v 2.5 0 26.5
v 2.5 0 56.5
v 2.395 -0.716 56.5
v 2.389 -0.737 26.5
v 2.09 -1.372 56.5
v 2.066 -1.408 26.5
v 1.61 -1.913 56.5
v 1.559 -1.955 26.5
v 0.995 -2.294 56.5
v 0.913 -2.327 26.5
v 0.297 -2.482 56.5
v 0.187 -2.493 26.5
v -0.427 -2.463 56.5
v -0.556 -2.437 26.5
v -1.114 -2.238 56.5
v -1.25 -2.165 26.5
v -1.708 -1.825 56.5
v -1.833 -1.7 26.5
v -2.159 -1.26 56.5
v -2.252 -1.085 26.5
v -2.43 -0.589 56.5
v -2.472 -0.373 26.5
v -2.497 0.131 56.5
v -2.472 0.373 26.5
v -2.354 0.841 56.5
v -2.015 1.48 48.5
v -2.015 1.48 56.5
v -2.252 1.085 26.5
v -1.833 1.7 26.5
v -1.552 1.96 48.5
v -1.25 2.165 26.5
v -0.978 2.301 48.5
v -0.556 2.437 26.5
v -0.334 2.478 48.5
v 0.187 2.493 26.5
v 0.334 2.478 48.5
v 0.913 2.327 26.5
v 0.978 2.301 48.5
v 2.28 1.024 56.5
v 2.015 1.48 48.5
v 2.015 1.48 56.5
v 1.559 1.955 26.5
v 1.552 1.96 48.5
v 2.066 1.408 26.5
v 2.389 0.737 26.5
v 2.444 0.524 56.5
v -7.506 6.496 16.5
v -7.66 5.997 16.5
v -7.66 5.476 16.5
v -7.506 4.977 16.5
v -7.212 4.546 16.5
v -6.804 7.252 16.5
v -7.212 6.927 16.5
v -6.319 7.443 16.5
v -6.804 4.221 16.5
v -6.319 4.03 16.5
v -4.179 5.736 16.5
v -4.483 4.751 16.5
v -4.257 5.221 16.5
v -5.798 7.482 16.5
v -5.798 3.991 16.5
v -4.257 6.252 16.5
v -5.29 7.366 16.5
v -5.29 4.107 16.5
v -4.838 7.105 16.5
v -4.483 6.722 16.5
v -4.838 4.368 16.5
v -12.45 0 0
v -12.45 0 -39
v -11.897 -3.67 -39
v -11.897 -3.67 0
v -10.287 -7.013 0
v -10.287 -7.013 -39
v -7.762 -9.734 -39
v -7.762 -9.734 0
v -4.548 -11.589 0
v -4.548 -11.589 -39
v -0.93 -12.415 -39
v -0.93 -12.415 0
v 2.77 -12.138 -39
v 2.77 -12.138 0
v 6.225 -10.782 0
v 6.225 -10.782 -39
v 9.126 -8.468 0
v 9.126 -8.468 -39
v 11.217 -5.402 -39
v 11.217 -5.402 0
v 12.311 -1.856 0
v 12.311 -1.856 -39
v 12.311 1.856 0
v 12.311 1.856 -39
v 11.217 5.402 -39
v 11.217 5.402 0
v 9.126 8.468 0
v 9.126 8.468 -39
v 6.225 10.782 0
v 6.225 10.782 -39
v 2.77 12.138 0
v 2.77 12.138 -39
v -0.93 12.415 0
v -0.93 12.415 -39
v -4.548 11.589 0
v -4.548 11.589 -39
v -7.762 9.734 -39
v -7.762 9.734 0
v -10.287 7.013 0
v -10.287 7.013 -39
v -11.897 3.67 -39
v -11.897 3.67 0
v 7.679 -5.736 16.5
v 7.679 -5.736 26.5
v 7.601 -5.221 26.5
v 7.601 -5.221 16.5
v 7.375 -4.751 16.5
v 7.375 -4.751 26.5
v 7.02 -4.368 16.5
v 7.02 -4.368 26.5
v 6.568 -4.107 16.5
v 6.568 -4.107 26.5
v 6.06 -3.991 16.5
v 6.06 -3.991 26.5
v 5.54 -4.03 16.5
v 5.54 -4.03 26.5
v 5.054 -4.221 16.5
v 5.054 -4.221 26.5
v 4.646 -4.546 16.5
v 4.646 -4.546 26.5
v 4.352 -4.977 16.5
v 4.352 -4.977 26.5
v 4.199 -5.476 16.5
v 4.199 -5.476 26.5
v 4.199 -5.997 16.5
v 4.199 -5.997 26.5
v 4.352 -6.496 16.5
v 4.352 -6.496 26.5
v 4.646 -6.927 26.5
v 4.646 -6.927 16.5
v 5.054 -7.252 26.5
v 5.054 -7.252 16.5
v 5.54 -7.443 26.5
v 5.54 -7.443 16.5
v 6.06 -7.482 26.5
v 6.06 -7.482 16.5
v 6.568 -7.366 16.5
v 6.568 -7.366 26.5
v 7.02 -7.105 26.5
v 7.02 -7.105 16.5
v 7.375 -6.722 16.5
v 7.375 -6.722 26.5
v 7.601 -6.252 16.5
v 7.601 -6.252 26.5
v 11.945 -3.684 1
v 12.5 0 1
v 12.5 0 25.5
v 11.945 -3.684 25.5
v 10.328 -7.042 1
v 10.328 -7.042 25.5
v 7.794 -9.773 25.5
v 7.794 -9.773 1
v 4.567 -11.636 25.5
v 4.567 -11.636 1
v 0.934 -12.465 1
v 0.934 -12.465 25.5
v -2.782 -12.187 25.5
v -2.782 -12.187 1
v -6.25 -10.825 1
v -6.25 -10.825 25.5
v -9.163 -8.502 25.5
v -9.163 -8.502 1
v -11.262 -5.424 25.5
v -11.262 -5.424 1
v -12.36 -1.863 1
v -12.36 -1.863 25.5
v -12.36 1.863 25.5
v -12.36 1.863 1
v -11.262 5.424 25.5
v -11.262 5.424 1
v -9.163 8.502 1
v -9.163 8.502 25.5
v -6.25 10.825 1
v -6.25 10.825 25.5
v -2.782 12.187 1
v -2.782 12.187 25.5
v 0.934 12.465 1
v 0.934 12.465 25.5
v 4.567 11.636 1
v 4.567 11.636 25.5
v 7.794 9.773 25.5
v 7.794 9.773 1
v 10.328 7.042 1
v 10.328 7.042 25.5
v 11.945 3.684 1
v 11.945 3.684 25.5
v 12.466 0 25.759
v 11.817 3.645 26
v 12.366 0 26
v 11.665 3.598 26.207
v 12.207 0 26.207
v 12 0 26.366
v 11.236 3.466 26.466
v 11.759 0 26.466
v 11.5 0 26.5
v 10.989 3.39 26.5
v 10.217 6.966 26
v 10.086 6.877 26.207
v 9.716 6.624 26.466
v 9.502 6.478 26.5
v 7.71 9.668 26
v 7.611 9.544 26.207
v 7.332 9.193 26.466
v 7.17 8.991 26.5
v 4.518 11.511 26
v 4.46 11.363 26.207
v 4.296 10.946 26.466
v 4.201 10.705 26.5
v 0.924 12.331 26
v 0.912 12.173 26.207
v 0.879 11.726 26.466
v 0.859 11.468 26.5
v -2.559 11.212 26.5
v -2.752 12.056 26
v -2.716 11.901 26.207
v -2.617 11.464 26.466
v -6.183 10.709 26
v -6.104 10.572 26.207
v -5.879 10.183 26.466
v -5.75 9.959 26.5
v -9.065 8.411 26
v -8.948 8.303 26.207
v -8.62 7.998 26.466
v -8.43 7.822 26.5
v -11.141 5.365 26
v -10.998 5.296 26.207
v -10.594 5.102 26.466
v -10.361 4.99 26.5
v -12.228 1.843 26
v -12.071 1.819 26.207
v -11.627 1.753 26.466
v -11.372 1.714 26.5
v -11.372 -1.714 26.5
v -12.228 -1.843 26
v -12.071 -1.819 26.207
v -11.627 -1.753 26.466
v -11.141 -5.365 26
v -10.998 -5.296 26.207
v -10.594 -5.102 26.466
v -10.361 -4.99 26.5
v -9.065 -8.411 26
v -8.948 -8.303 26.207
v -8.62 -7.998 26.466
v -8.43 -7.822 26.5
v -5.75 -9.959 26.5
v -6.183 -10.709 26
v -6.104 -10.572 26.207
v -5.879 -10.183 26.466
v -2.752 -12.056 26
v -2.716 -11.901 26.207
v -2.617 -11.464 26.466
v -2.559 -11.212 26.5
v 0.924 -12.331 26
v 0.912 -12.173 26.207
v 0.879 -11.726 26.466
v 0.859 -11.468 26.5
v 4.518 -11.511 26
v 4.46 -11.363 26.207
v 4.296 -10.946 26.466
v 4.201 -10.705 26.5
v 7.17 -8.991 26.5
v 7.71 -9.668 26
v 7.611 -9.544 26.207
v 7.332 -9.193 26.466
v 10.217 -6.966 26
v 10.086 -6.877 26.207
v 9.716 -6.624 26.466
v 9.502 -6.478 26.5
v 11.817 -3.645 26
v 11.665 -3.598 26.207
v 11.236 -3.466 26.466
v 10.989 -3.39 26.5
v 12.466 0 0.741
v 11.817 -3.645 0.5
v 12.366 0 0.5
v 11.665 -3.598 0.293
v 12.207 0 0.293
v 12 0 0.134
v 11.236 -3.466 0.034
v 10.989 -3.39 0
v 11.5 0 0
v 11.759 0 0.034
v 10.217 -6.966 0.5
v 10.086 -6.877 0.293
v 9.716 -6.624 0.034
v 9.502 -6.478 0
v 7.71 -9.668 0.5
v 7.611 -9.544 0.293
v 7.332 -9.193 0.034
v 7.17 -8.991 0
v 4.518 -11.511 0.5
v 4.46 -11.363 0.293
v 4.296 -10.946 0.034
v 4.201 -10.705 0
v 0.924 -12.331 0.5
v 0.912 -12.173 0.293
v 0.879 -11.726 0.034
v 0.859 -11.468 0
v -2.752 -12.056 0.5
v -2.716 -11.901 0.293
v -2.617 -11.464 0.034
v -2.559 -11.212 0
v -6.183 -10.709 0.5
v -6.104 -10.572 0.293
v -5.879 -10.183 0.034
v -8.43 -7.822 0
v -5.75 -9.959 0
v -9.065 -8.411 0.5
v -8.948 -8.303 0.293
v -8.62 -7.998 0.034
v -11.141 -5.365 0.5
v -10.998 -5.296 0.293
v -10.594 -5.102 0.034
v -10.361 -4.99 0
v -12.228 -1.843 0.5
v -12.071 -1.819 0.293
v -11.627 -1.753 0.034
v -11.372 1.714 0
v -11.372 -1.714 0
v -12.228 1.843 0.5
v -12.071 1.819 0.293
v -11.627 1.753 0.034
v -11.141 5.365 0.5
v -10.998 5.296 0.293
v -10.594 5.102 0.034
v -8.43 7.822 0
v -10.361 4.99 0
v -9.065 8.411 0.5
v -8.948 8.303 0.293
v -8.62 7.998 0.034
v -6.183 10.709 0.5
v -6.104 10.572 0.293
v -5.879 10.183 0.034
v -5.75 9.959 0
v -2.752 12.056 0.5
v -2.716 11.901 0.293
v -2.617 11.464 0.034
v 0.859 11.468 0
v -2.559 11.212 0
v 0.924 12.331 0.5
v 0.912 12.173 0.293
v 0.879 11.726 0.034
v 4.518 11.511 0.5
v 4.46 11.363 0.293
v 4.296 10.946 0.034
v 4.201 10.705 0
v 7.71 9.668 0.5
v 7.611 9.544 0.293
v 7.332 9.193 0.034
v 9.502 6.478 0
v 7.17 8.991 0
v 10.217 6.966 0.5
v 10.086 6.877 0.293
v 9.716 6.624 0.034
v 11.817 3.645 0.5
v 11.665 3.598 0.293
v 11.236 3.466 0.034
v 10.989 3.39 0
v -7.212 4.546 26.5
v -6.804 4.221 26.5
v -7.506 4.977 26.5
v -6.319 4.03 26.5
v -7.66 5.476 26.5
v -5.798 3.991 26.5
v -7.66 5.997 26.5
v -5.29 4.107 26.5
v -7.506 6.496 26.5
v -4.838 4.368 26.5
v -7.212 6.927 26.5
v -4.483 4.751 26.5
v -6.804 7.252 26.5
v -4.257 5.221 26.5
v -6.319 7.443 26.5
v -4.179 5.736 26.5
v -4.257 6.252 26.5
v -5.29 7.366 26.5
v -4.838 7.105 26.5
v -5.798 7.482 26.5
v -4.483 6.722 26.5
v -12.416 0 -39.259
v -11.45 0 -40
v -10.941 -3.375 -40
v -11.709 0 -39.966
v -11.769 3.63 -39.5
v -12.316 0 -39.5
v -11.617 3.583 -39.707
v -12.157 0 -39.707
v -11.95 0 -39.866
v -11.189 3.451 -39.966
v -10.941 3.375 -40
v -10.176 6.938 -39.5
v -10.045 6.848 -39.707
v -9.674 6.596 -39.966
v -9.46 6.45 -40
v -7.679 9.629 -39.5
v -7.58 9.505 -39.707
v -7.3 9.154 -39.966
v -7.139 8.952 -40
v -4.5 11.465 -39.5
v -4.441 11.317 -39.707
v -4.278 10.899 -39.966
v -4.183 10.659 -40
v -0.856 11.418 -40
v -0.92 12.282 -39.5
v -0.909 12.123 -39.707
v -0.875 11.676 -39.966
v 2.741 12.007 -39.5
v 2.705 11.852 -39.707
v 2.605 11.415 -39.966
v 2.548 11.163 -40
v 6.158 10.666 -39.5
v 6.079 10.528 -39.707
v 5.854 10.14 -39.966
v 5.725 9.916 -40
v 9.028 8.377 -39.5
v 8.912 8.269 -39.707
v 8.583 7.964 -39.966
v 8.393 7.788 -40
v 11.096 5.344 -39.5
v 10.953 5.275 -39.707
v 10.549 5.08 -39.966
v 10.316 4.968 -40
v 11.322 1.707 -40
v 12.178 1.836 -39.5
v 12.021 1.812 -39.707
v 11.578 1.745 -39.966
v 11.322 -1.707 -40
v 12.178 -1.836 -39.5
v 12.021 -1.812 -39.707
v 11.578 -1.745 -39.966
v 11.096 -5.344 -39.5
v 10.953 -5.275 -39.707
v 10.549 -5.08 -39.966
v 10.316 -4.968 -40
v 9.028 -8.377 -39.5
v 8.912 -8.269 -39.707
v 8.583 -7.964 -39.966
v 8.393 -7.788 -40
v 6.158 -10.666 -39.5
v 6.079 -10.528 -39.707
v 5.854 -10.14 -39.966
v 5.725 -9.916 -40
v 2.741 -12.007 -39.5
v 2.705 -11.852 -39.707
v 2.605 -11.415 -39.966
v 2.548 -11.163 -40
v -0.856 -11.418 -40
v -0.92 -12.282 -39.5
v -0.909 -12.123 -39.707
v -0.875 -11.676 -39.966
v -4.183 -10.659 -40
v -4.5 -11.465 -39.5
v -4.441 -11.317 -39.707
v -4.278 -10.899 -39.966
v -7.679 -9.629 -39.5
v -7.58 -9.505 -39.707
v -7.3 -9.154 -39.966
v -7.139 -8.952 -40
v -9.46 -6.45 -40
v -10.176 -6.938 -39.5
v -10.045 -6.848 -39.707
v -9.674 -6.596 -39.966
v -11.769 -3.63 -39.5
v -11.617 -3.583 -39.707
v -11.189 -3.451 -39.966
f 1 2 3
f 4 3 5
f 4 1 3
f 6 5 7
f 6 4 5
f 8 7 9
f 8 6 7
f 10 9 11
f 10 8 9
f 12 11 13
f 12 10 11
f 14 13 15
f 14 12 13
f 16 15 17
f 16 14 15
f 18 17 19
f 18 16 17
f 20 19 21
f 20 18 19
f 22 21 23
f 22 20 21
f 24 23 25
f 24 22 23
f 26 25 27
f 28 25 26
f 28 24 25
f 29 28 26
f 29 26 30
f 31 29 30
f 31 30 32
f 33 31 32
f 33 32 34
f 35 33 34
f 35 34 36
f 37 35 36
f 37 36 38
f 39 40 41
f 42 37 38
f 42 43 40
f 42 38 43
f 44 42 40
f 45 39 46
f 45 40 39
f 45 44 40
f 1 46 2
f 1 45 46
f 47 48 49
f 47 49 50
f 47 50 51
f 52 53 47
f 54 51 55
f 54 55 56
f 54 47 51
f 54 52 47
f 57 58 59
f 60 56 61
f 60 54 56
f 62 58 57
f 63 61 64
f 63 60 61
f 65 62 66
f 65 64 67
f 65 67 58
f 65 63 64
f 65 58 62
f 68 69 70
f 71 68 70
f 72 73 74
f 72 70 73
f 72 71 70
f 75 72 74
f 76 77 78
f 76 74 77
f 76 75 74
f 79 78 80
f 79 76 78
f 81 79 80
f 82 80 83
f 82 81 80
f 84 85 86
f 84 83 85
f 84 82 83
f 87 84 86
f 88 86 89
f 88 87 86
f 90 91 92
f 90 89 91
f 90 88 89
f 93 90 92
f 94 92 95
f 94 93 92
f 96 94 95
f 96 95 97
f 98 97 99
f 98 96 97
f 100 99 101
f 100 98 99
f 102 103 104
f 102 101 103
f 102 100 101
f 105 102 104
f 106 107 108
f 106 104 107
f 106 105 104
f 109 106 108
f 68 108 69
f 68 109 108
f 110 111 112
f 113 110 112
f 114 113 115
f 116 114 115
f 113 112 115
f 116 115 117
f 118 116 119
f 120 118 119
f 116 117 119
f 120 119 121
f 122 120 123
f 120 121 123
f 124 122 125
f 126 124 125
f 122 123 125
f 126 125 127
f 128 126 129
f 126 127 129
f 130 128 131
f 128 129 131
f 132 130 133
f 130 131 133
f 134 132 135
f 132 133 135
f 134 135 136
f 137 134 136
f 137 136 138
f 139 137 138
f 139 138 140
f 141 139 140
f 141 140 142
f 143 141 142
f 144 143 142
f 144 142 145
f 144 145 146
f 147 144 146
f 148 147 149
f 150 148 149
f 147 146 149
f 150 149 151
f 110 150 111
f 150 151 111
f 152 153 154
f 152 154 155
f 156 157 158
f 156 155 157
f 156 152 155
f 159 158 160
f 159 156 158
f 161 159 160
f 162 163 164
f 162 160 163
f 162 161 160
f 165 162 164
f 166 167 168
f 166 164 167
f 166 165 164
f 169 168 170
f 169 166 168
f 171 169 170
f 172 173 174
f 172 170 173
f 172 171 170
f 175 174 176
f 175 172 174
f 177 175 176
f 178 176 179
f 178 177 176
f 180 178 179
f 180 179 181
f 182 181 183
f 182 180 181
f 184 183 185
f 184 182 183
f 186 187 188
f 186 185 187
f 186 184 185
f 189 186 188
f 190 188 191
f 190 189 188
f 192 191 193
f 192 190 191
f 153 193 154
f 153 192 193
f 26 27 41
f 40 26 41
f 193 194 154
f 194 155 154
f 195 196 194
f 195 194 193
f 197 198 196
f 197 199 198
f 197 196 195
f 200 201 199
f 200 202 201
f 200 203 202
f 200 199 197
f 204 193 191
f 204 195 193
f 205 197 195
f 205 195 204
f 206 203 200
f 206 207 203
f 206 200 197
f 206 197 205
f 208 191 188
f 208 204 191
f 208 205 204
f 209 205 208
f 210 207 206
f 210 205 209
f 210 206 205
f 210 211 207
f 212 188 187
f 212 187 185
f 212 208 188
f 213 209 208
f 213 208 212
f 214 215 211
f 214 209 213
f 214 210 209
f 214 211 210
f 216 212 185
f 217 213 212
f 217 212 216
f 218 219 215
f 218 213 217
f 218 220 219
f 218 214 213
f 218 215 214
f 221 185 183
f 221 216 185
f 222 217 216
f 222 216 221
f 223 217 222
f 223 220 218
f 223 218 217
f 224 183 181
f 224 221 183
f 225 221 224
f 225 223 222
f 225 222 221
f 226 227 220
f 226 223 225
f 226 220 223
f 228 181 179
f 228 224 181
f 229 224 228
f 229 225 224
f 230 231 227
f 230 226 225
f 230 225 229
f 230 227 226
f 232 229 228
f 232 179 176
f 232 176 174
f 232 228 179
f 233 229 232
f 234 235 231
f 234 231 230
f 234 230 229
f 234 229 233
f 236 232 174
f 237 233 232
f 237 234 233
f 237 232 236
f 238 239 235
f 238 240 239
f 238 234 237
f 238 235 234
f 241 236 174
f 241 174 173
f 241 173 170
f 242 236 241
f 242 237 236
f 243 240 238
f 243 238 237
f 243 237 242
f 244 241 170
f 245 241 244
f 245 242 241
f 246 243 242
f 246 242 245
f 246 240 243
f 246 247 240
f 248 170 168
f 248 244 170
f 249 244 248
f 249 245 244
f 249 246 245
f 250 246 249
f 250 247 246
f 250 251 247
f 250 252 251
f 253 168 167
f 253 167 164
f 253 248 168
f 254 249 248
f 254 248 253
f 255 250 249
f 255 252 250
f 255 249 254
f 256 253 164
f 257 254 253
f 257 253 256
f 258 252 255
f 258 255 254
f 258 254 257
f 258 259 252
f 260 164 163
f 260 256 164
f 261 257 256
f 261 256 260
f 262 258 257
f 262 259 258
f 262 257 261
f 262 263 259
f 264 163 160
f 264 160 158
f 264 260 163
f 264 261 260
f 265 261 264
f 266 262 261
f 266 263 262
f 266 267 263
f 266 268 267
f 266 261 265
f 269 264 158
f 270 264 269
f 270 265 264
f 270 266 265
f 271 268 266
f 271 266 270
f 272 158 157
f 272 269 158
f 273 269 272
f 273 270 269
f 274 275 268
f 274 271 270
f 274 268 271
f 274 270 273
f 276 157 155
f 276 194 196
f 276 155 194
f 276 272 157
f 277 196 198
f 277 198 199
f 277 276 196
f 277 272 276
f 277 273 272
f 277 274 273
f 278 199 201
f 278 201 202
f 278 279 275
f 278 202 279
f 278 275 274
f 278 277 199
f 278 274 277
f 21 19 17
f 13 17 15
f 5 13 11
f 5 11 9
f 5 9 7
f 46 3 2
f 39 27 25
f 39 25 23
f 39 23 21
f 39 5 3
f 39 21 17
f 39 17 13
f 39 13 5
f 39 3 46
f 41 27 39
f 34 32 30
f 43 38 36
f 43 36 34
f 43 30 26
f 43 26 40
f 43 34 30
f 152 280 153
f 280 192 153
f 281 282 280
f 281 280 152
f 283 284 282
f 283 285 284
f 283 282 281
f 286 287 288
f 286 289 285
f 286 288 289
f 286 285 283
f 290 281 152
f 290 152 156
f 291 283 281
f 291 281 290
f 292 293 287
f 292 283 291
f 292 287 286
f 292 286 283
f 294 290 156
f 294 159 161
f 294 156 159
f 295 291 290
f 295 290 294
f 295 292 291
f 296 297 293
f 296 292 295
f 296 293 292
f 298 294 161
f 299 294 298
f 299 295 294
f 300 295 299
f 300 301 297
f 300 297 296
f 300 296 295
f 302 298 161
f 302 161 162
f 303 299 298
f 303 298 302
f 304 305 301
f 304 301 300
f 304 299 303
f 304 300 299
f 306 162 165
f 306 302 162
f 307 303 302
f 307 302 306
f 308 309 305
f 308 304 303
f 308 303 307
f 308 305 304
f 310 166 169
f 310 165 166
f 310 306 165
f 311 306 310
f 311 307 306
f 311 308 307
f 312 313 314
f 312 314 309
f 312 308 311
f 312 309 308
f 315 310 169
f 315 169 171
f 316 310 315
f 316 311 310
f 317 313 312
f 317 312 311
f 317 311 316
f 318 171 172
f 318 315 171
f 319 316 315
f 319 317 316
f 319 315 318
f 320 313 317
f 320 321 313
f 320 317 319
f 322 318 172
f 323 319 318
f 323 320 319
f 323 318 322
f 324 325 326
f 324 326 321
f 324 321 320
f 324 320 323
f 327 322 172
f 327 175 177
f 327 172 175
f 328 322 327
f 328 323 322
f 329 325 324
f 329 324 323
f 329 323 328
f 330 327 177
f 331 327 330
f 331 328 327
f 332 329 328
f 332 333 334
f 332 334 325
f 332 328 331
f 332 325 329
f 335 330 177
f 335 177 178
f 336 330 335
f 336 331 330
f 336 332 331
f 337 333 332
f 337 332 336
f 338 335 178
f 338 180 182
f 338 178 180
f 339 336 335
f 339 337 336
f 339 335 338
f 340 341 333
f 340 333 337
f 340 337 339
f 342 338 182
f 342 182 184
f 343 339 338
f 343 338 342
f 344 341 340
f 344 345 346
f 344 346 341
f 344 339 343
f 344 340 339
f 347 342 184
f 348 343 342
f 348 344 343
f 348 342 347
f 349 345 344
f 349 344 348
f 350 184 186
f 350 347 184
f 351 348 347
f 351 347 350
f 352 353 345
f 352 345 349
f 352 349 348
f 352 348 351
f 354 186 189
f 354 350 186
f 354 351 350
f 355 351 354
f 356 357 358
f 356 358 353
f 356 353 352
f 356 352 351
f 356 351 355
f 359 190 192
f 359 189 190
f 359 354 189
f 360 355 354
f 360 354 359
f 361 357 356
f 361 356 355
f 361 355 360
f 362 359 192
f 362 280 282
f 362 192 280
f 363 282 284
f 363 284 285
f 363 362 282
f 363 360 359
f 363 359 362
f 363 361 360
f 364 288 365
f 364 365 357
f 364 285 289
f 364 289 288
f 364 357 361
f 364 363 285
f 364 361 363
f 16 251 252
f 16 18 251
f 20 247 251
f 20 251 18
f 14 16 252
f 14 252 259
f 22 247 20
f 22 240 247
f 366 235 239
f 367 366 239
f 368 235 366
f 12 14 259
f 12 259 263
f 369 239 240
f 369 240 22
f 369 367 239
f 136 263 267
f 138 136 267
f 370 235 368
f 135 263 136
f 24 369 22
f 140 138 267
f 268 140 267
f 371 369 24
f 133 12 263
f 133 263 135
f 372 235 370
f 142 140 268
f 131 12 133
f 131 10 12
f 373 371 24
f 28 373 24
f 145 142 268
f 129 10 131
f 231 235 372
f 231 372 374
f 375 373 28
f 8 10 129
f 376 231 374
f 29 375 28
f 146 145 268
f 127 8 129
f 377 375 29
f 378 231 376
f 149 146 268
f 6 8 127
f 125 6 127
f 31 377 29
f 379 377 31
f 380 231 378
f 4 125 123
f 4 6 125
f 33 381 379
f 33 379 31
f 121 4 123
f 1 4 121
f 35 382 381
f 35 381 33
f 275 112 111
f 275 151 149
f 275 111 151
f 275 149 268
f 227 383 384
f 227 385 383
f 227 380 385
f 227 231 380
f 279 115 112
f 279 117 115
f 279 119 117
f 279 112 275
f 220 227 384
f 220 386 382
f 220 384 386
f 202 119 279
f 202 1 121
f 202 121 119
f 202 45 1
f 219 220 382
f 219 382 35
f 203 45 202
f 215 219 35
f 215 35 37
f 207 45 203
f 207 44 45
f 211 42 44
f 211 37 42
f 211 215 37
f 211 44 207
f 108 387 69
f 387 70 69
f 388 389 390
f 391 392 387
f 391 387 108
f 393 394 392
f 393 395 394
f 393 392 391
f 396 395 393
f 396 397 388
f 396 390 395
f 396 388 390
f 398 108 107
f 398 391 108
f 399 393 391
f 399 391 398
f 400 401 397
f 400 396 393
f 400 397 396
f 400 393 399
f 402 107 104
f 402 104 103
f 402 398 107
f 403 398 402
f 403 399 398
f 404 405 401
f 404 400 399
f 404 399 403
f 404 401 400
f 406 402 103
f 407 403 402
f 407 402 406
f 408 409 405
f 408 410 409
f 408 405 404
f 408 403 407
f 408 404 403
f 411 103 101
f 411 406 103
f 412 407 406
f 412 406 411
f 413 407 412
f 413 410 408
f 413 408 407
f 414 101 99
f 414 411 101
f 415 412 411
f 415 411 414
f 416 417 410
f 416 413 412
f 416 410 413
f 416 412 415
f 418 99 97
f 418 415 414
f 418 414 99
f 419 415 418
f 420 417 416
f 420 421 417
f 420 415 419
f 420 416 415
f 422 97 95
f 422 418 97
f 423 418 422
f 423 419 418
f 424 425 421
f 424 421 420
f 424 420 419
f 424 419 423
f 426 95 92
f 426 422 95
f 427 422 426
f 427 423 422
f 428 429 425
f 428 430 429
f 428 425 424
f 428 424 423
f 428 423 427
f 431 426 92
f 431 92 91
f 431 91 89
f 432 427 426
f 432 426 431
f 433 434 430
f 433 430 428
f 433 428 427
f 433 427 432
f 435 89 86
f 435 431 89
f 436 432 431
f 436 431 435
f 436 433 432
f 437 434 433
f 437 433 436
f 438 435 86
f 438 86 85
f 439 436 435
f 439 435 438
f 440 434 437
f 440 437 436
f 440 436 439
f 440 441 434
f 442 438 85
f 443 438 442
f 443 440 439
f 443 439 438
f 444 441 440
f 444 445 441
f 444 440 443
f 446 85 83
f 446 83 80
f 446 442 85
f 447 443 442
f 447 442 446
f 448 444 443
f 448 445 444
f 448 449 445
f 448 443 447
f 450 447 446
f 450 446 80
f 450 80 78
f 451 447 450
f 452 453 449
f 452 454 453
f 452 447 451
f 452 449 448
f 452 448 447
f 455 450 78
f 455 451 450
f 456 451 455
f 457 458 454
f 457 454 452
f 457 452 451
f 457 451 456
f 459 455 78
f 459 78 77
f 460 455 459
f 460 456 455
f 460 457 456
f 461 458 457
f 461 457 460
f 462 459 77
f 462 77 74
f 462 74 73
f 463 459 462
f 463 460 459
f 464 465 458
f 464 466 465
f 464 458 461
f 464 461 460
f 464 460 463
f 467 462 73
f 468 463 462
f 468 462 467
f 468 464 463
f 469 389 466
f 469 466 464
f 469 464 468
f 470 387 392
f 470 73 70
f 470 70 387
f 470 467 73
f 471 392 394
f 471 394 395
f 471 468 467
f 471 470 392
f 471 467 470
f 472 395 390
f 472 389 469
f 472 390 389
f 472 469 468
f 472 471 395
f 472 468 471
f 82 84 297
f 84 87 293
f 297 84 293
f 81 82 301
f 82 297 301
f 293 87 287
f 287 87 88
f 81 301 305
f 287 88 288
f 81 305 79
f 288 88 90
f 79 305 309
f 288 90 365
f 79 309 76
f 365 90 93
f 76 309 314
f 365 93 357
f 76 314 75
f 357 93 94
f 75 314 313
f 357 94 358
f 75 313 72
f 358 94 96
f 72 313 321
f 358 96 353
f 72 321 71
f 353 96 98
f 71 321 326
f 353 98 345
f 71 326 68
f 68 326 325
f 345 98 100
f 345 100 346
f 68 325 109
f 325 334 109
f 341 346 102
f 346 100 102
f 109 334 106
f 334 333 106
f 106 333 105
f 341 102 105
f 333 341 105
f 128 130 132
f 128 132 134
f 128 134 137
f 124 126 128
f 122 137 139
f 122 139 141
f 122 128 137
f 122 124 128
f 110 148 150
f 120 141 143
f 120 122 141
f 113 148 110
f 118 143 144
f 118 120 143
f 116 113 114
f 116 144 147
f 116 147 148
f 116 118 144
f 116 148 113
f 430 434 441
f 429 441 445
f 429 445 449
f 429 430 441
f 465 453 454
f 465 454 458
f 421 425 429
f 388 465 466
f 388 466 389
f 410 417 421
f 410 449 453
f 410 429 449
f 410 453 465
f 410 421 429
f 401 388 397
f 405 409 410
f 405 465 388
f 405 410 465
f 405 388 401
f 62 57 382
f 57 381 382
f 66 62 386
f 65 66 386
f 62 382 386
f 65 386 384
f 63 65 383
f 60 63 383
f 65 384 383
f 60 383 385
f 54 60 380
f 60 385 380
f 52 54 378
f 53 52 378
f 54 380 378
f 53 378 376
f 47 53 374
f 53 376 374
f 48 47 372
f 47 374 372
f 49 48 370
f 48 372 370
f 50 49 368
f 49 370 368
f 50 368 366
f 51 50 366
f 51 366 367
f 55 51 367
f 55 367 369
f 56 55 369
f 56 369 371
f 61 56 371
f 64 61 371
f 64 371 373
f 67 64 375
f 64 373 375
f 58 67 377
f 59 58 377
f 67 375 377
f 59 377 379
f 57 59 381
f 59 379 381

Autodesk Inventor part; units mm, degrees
ref_plane "YZ Plane" through (0, 0, 0) normal (1, 0, 0) x (0, 1, 0)
ref_plane "XZ Plane" through (0, 0, 0) normal (0, 1, 0) x (-1, 0, 0)
ref_plane "XY Plane" through (0, 0, 0) normal (0, 0, 1) x (1, 0, 0)
sketch "Sketch1" plane through (0, 0, 0) normal (0, 0, 1) x (1, 0, 0)
  circle A0 centre (0, 0) radius 12.5
  dimension "d0" = 25
extrude "Extrusion1" add sketch "Sketch1" along normal blind 26.5
fillet "Fillet1" radius 1 2 edges at (-12.5, 0, 26.5) (-12.5, 0, 0)
sketch "Sketch2" plane through (0, 0, 26.5) normal (0, 0, 1) x (1, 0, 0)
  circle A0 centre (-5.9291, 5.7365) radius 1.75
  line L0 (-5.9291, 5.7365) -> (0, 0) construction
  line L1 (0, 0) -> (5.9291, -5.7365) construction
  circle A1 centre (5.9291, -5.7365) radius 1.75
  dimension "d5" = 3.5
  dimension "d6" = 3.5
  dimension "d7" = 16.5
extrude "Extrusion2" cut sketch "Sketch2" against normal blind 10
sketch "Sketch3" plane through (0, 0, 0) normal (0, 0, -1) x (-1, 0, 0)
  circle A0 centre (0, 0) radius 12.45
  dimension "d10" = 24.9
extrude "Extrusion3" add sketch "Sketch3" along normal blind 40
sketch "Sketch4" plane through (0, 0, 26.5) normal (0, 0, 1) x (1, 0, 0)
  circle A0 centre (0, 0) radius 2.5
  dimension "d13" = 5
extrude "Extrusion4" add sketch "Sketch4" along normal blind 30
sketch "Sketch5" plane through (0, 0, 56.5) normal (0, 0, 1) x (1, 0, 0)
  circle A0 centre (0, 0) radius 2.5 projected
  line L0 (-2.0152, 1.4796) -> (2.0152, 1.4796)
  arc A1 (2.0152, 1.4796) -> (-2.0152, 1.4796) centre (0, 0) ccw
extrude "Extrusion5" cut sketch "Sketch5" against normal blind 8 contours L0 A0 picked at (0.5388, 1.6221)
fillet "Fillet2" radius 1 1 edges at (12.45, 0, -40)
properties part number "platform_motor"
